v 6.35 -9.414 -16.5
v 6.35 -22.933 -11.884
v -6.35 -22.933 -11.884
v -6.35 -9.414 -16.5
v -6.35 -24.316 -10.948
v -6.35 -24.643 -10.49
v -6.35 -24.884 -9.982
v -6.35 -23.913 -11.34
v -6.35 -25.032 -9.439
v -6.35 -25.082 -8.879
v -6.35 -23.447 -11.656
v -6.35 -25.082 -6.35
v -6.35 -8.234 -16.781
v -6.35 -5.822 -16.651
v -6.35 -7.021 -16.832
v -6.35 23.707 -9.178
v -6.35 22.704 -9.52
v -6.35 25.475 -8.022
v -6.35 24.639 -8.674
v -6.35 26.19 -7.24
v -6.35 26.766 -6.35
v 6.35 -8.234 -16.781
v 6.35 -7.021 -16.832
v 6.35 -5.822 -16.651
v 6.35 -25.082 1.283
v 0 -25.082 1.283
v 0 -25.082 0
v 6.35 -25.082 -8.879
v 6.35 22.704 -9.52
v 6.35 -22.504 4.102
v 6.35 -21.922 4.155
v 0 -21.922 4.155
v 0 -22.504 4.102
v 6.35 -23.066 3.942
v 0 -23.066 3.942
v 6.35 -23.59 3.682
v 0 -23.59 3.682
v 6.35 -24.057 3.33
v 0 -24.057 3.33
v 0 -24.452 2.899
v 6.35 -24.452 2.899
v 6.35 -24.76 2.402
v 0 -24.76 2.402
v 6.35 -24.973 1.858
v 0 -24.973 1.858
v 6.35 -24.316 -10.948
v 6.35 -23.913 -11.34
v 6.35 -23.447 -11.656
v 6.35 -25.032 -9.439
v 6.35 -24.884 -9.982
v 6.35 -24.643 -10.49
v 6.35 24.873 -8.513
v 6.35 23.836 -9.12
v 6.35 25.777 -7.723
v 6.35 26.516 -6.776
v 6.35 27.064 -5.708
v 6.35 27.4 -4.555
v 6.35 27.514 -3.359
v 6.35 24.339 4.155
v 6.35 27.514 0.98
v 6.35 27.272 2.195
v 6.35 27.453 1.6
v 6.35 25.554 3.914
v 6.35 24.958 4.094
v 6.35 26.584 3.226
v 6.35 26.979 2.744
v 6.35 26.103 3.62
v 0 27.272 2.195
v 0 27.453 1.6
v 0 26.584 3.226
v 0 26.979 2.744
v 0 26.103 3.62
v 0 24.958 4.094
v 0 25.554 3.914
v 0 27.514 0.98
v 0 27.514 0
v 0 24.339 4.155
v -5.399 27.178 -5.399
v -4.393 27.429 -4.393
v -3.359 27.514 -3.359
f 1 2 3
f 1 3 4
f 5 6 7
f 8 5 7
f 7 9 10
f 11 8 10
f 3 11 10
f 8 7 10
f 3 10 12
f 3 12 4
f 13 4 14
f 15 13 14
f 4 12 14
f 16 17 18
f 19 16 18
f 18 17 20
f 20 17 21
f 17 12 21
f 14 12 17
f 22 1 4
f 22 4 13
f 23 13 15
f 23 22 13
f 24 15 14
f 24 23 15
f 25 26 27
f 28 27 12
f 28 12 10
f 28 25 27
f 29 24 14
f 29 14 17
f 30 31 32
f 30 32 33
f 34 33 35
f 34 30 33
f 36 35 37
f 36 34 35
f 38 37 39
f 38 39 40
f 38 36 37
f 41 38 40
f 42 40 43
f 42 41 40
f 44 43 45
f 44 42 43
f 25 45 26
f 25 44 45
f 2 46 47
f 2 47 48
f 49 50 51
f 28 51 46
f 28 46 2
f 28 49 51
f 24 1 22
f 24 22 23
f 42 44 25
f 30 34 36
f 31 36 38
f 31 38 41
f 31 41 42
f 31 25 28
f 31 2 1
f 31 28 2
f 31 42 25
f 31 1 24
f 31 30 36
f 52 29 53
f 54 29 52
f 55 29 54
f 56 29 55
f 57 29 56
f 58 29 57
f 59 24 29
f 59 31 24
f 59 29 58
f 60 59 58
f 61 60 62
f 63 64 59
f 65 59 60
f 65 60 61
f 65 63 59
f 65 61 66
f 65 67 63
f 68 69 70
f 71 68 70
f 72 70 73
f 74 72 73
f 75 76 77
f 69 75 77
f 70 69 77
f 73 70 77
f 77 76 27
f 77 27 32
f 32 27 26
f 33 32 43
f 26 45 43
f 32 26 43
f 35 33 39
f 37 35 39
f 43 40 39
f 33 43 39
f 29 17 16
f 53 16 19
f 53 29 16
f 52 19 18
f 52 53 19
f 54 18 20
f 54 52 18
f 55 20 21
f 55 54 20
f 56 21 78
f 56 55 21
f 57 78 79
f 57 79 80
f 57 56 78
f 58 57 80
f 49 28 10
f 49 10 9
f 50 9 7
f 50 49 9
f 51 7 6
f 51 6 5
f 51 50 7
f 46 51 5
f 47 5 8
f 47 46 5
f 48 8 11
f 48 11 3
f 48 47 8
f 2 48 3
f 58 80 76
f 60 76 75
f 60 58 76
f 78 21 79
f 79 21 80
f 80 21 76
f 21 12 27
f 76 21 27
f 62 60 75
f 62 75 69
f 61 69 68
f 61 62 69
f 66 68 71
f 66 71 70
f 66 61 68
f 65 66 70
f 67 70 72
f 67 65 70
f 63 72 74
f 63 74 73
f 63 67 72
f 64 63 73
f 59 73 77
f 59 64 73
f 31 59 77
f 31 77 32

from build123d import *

# Parameters (mm, degrees)
F1_DEPTH = 6.35
F3_DEPTH = 38.1


with BuildPart() as f1:
    # F0 (on Right) → F1 (new body, symmetric)
    with BuildSketch(Plane.YZ):
        with BuildLine():
            Line((24.33887, 4.155473), (-21.92162, 4.155473))
            ThreePointArc((-21.92162, 4.155473), (-24.056937, 3.330164), (-25.082145, 1.283298))
            Line((-25.082145, 1.283298), (-25.082145, -8.879172))
            ThreePointArc((-25.082145, -8.879172), (-24.489592, -10.726222), (-22.93311, -11.883839))
            Line((-22.93311, -11.883839), (-9.41385, -16.500088))
            ThreePointArc((-9.41385, -16.500088), (-7.628749, -16.835147), (-5.821818, -16.65116))
            Line((-5.821818, -16.65116), (22.703972, -9.519713))
            ThreePointArc((22.703972, -9.519713), (26.168975, -7.267175), (27.51387, -3.359308))
            Line((27.51387, -3.359308), (27.51387, 0.980473))
            ThreePointArc((27.51387, 0.980473), (26.583934, 3.225537), (24.33887, 4.155473))
        make_face()
    extrude(amount=F1_DEPTH, both=True)

    # F2 (on Front) → F3 (cut, symmetric)
    with BuildSketch(Plane.XZ):
        Polygon((-6.35, -6.35), (0, 0), (0, 6.35), (-12.7, 6.35), (-12.7, -6.35), align=None)
    extrude(amount=F3_DEPTH, both=True, mode=Mode.SUBTRACT)


solid = f1.part
